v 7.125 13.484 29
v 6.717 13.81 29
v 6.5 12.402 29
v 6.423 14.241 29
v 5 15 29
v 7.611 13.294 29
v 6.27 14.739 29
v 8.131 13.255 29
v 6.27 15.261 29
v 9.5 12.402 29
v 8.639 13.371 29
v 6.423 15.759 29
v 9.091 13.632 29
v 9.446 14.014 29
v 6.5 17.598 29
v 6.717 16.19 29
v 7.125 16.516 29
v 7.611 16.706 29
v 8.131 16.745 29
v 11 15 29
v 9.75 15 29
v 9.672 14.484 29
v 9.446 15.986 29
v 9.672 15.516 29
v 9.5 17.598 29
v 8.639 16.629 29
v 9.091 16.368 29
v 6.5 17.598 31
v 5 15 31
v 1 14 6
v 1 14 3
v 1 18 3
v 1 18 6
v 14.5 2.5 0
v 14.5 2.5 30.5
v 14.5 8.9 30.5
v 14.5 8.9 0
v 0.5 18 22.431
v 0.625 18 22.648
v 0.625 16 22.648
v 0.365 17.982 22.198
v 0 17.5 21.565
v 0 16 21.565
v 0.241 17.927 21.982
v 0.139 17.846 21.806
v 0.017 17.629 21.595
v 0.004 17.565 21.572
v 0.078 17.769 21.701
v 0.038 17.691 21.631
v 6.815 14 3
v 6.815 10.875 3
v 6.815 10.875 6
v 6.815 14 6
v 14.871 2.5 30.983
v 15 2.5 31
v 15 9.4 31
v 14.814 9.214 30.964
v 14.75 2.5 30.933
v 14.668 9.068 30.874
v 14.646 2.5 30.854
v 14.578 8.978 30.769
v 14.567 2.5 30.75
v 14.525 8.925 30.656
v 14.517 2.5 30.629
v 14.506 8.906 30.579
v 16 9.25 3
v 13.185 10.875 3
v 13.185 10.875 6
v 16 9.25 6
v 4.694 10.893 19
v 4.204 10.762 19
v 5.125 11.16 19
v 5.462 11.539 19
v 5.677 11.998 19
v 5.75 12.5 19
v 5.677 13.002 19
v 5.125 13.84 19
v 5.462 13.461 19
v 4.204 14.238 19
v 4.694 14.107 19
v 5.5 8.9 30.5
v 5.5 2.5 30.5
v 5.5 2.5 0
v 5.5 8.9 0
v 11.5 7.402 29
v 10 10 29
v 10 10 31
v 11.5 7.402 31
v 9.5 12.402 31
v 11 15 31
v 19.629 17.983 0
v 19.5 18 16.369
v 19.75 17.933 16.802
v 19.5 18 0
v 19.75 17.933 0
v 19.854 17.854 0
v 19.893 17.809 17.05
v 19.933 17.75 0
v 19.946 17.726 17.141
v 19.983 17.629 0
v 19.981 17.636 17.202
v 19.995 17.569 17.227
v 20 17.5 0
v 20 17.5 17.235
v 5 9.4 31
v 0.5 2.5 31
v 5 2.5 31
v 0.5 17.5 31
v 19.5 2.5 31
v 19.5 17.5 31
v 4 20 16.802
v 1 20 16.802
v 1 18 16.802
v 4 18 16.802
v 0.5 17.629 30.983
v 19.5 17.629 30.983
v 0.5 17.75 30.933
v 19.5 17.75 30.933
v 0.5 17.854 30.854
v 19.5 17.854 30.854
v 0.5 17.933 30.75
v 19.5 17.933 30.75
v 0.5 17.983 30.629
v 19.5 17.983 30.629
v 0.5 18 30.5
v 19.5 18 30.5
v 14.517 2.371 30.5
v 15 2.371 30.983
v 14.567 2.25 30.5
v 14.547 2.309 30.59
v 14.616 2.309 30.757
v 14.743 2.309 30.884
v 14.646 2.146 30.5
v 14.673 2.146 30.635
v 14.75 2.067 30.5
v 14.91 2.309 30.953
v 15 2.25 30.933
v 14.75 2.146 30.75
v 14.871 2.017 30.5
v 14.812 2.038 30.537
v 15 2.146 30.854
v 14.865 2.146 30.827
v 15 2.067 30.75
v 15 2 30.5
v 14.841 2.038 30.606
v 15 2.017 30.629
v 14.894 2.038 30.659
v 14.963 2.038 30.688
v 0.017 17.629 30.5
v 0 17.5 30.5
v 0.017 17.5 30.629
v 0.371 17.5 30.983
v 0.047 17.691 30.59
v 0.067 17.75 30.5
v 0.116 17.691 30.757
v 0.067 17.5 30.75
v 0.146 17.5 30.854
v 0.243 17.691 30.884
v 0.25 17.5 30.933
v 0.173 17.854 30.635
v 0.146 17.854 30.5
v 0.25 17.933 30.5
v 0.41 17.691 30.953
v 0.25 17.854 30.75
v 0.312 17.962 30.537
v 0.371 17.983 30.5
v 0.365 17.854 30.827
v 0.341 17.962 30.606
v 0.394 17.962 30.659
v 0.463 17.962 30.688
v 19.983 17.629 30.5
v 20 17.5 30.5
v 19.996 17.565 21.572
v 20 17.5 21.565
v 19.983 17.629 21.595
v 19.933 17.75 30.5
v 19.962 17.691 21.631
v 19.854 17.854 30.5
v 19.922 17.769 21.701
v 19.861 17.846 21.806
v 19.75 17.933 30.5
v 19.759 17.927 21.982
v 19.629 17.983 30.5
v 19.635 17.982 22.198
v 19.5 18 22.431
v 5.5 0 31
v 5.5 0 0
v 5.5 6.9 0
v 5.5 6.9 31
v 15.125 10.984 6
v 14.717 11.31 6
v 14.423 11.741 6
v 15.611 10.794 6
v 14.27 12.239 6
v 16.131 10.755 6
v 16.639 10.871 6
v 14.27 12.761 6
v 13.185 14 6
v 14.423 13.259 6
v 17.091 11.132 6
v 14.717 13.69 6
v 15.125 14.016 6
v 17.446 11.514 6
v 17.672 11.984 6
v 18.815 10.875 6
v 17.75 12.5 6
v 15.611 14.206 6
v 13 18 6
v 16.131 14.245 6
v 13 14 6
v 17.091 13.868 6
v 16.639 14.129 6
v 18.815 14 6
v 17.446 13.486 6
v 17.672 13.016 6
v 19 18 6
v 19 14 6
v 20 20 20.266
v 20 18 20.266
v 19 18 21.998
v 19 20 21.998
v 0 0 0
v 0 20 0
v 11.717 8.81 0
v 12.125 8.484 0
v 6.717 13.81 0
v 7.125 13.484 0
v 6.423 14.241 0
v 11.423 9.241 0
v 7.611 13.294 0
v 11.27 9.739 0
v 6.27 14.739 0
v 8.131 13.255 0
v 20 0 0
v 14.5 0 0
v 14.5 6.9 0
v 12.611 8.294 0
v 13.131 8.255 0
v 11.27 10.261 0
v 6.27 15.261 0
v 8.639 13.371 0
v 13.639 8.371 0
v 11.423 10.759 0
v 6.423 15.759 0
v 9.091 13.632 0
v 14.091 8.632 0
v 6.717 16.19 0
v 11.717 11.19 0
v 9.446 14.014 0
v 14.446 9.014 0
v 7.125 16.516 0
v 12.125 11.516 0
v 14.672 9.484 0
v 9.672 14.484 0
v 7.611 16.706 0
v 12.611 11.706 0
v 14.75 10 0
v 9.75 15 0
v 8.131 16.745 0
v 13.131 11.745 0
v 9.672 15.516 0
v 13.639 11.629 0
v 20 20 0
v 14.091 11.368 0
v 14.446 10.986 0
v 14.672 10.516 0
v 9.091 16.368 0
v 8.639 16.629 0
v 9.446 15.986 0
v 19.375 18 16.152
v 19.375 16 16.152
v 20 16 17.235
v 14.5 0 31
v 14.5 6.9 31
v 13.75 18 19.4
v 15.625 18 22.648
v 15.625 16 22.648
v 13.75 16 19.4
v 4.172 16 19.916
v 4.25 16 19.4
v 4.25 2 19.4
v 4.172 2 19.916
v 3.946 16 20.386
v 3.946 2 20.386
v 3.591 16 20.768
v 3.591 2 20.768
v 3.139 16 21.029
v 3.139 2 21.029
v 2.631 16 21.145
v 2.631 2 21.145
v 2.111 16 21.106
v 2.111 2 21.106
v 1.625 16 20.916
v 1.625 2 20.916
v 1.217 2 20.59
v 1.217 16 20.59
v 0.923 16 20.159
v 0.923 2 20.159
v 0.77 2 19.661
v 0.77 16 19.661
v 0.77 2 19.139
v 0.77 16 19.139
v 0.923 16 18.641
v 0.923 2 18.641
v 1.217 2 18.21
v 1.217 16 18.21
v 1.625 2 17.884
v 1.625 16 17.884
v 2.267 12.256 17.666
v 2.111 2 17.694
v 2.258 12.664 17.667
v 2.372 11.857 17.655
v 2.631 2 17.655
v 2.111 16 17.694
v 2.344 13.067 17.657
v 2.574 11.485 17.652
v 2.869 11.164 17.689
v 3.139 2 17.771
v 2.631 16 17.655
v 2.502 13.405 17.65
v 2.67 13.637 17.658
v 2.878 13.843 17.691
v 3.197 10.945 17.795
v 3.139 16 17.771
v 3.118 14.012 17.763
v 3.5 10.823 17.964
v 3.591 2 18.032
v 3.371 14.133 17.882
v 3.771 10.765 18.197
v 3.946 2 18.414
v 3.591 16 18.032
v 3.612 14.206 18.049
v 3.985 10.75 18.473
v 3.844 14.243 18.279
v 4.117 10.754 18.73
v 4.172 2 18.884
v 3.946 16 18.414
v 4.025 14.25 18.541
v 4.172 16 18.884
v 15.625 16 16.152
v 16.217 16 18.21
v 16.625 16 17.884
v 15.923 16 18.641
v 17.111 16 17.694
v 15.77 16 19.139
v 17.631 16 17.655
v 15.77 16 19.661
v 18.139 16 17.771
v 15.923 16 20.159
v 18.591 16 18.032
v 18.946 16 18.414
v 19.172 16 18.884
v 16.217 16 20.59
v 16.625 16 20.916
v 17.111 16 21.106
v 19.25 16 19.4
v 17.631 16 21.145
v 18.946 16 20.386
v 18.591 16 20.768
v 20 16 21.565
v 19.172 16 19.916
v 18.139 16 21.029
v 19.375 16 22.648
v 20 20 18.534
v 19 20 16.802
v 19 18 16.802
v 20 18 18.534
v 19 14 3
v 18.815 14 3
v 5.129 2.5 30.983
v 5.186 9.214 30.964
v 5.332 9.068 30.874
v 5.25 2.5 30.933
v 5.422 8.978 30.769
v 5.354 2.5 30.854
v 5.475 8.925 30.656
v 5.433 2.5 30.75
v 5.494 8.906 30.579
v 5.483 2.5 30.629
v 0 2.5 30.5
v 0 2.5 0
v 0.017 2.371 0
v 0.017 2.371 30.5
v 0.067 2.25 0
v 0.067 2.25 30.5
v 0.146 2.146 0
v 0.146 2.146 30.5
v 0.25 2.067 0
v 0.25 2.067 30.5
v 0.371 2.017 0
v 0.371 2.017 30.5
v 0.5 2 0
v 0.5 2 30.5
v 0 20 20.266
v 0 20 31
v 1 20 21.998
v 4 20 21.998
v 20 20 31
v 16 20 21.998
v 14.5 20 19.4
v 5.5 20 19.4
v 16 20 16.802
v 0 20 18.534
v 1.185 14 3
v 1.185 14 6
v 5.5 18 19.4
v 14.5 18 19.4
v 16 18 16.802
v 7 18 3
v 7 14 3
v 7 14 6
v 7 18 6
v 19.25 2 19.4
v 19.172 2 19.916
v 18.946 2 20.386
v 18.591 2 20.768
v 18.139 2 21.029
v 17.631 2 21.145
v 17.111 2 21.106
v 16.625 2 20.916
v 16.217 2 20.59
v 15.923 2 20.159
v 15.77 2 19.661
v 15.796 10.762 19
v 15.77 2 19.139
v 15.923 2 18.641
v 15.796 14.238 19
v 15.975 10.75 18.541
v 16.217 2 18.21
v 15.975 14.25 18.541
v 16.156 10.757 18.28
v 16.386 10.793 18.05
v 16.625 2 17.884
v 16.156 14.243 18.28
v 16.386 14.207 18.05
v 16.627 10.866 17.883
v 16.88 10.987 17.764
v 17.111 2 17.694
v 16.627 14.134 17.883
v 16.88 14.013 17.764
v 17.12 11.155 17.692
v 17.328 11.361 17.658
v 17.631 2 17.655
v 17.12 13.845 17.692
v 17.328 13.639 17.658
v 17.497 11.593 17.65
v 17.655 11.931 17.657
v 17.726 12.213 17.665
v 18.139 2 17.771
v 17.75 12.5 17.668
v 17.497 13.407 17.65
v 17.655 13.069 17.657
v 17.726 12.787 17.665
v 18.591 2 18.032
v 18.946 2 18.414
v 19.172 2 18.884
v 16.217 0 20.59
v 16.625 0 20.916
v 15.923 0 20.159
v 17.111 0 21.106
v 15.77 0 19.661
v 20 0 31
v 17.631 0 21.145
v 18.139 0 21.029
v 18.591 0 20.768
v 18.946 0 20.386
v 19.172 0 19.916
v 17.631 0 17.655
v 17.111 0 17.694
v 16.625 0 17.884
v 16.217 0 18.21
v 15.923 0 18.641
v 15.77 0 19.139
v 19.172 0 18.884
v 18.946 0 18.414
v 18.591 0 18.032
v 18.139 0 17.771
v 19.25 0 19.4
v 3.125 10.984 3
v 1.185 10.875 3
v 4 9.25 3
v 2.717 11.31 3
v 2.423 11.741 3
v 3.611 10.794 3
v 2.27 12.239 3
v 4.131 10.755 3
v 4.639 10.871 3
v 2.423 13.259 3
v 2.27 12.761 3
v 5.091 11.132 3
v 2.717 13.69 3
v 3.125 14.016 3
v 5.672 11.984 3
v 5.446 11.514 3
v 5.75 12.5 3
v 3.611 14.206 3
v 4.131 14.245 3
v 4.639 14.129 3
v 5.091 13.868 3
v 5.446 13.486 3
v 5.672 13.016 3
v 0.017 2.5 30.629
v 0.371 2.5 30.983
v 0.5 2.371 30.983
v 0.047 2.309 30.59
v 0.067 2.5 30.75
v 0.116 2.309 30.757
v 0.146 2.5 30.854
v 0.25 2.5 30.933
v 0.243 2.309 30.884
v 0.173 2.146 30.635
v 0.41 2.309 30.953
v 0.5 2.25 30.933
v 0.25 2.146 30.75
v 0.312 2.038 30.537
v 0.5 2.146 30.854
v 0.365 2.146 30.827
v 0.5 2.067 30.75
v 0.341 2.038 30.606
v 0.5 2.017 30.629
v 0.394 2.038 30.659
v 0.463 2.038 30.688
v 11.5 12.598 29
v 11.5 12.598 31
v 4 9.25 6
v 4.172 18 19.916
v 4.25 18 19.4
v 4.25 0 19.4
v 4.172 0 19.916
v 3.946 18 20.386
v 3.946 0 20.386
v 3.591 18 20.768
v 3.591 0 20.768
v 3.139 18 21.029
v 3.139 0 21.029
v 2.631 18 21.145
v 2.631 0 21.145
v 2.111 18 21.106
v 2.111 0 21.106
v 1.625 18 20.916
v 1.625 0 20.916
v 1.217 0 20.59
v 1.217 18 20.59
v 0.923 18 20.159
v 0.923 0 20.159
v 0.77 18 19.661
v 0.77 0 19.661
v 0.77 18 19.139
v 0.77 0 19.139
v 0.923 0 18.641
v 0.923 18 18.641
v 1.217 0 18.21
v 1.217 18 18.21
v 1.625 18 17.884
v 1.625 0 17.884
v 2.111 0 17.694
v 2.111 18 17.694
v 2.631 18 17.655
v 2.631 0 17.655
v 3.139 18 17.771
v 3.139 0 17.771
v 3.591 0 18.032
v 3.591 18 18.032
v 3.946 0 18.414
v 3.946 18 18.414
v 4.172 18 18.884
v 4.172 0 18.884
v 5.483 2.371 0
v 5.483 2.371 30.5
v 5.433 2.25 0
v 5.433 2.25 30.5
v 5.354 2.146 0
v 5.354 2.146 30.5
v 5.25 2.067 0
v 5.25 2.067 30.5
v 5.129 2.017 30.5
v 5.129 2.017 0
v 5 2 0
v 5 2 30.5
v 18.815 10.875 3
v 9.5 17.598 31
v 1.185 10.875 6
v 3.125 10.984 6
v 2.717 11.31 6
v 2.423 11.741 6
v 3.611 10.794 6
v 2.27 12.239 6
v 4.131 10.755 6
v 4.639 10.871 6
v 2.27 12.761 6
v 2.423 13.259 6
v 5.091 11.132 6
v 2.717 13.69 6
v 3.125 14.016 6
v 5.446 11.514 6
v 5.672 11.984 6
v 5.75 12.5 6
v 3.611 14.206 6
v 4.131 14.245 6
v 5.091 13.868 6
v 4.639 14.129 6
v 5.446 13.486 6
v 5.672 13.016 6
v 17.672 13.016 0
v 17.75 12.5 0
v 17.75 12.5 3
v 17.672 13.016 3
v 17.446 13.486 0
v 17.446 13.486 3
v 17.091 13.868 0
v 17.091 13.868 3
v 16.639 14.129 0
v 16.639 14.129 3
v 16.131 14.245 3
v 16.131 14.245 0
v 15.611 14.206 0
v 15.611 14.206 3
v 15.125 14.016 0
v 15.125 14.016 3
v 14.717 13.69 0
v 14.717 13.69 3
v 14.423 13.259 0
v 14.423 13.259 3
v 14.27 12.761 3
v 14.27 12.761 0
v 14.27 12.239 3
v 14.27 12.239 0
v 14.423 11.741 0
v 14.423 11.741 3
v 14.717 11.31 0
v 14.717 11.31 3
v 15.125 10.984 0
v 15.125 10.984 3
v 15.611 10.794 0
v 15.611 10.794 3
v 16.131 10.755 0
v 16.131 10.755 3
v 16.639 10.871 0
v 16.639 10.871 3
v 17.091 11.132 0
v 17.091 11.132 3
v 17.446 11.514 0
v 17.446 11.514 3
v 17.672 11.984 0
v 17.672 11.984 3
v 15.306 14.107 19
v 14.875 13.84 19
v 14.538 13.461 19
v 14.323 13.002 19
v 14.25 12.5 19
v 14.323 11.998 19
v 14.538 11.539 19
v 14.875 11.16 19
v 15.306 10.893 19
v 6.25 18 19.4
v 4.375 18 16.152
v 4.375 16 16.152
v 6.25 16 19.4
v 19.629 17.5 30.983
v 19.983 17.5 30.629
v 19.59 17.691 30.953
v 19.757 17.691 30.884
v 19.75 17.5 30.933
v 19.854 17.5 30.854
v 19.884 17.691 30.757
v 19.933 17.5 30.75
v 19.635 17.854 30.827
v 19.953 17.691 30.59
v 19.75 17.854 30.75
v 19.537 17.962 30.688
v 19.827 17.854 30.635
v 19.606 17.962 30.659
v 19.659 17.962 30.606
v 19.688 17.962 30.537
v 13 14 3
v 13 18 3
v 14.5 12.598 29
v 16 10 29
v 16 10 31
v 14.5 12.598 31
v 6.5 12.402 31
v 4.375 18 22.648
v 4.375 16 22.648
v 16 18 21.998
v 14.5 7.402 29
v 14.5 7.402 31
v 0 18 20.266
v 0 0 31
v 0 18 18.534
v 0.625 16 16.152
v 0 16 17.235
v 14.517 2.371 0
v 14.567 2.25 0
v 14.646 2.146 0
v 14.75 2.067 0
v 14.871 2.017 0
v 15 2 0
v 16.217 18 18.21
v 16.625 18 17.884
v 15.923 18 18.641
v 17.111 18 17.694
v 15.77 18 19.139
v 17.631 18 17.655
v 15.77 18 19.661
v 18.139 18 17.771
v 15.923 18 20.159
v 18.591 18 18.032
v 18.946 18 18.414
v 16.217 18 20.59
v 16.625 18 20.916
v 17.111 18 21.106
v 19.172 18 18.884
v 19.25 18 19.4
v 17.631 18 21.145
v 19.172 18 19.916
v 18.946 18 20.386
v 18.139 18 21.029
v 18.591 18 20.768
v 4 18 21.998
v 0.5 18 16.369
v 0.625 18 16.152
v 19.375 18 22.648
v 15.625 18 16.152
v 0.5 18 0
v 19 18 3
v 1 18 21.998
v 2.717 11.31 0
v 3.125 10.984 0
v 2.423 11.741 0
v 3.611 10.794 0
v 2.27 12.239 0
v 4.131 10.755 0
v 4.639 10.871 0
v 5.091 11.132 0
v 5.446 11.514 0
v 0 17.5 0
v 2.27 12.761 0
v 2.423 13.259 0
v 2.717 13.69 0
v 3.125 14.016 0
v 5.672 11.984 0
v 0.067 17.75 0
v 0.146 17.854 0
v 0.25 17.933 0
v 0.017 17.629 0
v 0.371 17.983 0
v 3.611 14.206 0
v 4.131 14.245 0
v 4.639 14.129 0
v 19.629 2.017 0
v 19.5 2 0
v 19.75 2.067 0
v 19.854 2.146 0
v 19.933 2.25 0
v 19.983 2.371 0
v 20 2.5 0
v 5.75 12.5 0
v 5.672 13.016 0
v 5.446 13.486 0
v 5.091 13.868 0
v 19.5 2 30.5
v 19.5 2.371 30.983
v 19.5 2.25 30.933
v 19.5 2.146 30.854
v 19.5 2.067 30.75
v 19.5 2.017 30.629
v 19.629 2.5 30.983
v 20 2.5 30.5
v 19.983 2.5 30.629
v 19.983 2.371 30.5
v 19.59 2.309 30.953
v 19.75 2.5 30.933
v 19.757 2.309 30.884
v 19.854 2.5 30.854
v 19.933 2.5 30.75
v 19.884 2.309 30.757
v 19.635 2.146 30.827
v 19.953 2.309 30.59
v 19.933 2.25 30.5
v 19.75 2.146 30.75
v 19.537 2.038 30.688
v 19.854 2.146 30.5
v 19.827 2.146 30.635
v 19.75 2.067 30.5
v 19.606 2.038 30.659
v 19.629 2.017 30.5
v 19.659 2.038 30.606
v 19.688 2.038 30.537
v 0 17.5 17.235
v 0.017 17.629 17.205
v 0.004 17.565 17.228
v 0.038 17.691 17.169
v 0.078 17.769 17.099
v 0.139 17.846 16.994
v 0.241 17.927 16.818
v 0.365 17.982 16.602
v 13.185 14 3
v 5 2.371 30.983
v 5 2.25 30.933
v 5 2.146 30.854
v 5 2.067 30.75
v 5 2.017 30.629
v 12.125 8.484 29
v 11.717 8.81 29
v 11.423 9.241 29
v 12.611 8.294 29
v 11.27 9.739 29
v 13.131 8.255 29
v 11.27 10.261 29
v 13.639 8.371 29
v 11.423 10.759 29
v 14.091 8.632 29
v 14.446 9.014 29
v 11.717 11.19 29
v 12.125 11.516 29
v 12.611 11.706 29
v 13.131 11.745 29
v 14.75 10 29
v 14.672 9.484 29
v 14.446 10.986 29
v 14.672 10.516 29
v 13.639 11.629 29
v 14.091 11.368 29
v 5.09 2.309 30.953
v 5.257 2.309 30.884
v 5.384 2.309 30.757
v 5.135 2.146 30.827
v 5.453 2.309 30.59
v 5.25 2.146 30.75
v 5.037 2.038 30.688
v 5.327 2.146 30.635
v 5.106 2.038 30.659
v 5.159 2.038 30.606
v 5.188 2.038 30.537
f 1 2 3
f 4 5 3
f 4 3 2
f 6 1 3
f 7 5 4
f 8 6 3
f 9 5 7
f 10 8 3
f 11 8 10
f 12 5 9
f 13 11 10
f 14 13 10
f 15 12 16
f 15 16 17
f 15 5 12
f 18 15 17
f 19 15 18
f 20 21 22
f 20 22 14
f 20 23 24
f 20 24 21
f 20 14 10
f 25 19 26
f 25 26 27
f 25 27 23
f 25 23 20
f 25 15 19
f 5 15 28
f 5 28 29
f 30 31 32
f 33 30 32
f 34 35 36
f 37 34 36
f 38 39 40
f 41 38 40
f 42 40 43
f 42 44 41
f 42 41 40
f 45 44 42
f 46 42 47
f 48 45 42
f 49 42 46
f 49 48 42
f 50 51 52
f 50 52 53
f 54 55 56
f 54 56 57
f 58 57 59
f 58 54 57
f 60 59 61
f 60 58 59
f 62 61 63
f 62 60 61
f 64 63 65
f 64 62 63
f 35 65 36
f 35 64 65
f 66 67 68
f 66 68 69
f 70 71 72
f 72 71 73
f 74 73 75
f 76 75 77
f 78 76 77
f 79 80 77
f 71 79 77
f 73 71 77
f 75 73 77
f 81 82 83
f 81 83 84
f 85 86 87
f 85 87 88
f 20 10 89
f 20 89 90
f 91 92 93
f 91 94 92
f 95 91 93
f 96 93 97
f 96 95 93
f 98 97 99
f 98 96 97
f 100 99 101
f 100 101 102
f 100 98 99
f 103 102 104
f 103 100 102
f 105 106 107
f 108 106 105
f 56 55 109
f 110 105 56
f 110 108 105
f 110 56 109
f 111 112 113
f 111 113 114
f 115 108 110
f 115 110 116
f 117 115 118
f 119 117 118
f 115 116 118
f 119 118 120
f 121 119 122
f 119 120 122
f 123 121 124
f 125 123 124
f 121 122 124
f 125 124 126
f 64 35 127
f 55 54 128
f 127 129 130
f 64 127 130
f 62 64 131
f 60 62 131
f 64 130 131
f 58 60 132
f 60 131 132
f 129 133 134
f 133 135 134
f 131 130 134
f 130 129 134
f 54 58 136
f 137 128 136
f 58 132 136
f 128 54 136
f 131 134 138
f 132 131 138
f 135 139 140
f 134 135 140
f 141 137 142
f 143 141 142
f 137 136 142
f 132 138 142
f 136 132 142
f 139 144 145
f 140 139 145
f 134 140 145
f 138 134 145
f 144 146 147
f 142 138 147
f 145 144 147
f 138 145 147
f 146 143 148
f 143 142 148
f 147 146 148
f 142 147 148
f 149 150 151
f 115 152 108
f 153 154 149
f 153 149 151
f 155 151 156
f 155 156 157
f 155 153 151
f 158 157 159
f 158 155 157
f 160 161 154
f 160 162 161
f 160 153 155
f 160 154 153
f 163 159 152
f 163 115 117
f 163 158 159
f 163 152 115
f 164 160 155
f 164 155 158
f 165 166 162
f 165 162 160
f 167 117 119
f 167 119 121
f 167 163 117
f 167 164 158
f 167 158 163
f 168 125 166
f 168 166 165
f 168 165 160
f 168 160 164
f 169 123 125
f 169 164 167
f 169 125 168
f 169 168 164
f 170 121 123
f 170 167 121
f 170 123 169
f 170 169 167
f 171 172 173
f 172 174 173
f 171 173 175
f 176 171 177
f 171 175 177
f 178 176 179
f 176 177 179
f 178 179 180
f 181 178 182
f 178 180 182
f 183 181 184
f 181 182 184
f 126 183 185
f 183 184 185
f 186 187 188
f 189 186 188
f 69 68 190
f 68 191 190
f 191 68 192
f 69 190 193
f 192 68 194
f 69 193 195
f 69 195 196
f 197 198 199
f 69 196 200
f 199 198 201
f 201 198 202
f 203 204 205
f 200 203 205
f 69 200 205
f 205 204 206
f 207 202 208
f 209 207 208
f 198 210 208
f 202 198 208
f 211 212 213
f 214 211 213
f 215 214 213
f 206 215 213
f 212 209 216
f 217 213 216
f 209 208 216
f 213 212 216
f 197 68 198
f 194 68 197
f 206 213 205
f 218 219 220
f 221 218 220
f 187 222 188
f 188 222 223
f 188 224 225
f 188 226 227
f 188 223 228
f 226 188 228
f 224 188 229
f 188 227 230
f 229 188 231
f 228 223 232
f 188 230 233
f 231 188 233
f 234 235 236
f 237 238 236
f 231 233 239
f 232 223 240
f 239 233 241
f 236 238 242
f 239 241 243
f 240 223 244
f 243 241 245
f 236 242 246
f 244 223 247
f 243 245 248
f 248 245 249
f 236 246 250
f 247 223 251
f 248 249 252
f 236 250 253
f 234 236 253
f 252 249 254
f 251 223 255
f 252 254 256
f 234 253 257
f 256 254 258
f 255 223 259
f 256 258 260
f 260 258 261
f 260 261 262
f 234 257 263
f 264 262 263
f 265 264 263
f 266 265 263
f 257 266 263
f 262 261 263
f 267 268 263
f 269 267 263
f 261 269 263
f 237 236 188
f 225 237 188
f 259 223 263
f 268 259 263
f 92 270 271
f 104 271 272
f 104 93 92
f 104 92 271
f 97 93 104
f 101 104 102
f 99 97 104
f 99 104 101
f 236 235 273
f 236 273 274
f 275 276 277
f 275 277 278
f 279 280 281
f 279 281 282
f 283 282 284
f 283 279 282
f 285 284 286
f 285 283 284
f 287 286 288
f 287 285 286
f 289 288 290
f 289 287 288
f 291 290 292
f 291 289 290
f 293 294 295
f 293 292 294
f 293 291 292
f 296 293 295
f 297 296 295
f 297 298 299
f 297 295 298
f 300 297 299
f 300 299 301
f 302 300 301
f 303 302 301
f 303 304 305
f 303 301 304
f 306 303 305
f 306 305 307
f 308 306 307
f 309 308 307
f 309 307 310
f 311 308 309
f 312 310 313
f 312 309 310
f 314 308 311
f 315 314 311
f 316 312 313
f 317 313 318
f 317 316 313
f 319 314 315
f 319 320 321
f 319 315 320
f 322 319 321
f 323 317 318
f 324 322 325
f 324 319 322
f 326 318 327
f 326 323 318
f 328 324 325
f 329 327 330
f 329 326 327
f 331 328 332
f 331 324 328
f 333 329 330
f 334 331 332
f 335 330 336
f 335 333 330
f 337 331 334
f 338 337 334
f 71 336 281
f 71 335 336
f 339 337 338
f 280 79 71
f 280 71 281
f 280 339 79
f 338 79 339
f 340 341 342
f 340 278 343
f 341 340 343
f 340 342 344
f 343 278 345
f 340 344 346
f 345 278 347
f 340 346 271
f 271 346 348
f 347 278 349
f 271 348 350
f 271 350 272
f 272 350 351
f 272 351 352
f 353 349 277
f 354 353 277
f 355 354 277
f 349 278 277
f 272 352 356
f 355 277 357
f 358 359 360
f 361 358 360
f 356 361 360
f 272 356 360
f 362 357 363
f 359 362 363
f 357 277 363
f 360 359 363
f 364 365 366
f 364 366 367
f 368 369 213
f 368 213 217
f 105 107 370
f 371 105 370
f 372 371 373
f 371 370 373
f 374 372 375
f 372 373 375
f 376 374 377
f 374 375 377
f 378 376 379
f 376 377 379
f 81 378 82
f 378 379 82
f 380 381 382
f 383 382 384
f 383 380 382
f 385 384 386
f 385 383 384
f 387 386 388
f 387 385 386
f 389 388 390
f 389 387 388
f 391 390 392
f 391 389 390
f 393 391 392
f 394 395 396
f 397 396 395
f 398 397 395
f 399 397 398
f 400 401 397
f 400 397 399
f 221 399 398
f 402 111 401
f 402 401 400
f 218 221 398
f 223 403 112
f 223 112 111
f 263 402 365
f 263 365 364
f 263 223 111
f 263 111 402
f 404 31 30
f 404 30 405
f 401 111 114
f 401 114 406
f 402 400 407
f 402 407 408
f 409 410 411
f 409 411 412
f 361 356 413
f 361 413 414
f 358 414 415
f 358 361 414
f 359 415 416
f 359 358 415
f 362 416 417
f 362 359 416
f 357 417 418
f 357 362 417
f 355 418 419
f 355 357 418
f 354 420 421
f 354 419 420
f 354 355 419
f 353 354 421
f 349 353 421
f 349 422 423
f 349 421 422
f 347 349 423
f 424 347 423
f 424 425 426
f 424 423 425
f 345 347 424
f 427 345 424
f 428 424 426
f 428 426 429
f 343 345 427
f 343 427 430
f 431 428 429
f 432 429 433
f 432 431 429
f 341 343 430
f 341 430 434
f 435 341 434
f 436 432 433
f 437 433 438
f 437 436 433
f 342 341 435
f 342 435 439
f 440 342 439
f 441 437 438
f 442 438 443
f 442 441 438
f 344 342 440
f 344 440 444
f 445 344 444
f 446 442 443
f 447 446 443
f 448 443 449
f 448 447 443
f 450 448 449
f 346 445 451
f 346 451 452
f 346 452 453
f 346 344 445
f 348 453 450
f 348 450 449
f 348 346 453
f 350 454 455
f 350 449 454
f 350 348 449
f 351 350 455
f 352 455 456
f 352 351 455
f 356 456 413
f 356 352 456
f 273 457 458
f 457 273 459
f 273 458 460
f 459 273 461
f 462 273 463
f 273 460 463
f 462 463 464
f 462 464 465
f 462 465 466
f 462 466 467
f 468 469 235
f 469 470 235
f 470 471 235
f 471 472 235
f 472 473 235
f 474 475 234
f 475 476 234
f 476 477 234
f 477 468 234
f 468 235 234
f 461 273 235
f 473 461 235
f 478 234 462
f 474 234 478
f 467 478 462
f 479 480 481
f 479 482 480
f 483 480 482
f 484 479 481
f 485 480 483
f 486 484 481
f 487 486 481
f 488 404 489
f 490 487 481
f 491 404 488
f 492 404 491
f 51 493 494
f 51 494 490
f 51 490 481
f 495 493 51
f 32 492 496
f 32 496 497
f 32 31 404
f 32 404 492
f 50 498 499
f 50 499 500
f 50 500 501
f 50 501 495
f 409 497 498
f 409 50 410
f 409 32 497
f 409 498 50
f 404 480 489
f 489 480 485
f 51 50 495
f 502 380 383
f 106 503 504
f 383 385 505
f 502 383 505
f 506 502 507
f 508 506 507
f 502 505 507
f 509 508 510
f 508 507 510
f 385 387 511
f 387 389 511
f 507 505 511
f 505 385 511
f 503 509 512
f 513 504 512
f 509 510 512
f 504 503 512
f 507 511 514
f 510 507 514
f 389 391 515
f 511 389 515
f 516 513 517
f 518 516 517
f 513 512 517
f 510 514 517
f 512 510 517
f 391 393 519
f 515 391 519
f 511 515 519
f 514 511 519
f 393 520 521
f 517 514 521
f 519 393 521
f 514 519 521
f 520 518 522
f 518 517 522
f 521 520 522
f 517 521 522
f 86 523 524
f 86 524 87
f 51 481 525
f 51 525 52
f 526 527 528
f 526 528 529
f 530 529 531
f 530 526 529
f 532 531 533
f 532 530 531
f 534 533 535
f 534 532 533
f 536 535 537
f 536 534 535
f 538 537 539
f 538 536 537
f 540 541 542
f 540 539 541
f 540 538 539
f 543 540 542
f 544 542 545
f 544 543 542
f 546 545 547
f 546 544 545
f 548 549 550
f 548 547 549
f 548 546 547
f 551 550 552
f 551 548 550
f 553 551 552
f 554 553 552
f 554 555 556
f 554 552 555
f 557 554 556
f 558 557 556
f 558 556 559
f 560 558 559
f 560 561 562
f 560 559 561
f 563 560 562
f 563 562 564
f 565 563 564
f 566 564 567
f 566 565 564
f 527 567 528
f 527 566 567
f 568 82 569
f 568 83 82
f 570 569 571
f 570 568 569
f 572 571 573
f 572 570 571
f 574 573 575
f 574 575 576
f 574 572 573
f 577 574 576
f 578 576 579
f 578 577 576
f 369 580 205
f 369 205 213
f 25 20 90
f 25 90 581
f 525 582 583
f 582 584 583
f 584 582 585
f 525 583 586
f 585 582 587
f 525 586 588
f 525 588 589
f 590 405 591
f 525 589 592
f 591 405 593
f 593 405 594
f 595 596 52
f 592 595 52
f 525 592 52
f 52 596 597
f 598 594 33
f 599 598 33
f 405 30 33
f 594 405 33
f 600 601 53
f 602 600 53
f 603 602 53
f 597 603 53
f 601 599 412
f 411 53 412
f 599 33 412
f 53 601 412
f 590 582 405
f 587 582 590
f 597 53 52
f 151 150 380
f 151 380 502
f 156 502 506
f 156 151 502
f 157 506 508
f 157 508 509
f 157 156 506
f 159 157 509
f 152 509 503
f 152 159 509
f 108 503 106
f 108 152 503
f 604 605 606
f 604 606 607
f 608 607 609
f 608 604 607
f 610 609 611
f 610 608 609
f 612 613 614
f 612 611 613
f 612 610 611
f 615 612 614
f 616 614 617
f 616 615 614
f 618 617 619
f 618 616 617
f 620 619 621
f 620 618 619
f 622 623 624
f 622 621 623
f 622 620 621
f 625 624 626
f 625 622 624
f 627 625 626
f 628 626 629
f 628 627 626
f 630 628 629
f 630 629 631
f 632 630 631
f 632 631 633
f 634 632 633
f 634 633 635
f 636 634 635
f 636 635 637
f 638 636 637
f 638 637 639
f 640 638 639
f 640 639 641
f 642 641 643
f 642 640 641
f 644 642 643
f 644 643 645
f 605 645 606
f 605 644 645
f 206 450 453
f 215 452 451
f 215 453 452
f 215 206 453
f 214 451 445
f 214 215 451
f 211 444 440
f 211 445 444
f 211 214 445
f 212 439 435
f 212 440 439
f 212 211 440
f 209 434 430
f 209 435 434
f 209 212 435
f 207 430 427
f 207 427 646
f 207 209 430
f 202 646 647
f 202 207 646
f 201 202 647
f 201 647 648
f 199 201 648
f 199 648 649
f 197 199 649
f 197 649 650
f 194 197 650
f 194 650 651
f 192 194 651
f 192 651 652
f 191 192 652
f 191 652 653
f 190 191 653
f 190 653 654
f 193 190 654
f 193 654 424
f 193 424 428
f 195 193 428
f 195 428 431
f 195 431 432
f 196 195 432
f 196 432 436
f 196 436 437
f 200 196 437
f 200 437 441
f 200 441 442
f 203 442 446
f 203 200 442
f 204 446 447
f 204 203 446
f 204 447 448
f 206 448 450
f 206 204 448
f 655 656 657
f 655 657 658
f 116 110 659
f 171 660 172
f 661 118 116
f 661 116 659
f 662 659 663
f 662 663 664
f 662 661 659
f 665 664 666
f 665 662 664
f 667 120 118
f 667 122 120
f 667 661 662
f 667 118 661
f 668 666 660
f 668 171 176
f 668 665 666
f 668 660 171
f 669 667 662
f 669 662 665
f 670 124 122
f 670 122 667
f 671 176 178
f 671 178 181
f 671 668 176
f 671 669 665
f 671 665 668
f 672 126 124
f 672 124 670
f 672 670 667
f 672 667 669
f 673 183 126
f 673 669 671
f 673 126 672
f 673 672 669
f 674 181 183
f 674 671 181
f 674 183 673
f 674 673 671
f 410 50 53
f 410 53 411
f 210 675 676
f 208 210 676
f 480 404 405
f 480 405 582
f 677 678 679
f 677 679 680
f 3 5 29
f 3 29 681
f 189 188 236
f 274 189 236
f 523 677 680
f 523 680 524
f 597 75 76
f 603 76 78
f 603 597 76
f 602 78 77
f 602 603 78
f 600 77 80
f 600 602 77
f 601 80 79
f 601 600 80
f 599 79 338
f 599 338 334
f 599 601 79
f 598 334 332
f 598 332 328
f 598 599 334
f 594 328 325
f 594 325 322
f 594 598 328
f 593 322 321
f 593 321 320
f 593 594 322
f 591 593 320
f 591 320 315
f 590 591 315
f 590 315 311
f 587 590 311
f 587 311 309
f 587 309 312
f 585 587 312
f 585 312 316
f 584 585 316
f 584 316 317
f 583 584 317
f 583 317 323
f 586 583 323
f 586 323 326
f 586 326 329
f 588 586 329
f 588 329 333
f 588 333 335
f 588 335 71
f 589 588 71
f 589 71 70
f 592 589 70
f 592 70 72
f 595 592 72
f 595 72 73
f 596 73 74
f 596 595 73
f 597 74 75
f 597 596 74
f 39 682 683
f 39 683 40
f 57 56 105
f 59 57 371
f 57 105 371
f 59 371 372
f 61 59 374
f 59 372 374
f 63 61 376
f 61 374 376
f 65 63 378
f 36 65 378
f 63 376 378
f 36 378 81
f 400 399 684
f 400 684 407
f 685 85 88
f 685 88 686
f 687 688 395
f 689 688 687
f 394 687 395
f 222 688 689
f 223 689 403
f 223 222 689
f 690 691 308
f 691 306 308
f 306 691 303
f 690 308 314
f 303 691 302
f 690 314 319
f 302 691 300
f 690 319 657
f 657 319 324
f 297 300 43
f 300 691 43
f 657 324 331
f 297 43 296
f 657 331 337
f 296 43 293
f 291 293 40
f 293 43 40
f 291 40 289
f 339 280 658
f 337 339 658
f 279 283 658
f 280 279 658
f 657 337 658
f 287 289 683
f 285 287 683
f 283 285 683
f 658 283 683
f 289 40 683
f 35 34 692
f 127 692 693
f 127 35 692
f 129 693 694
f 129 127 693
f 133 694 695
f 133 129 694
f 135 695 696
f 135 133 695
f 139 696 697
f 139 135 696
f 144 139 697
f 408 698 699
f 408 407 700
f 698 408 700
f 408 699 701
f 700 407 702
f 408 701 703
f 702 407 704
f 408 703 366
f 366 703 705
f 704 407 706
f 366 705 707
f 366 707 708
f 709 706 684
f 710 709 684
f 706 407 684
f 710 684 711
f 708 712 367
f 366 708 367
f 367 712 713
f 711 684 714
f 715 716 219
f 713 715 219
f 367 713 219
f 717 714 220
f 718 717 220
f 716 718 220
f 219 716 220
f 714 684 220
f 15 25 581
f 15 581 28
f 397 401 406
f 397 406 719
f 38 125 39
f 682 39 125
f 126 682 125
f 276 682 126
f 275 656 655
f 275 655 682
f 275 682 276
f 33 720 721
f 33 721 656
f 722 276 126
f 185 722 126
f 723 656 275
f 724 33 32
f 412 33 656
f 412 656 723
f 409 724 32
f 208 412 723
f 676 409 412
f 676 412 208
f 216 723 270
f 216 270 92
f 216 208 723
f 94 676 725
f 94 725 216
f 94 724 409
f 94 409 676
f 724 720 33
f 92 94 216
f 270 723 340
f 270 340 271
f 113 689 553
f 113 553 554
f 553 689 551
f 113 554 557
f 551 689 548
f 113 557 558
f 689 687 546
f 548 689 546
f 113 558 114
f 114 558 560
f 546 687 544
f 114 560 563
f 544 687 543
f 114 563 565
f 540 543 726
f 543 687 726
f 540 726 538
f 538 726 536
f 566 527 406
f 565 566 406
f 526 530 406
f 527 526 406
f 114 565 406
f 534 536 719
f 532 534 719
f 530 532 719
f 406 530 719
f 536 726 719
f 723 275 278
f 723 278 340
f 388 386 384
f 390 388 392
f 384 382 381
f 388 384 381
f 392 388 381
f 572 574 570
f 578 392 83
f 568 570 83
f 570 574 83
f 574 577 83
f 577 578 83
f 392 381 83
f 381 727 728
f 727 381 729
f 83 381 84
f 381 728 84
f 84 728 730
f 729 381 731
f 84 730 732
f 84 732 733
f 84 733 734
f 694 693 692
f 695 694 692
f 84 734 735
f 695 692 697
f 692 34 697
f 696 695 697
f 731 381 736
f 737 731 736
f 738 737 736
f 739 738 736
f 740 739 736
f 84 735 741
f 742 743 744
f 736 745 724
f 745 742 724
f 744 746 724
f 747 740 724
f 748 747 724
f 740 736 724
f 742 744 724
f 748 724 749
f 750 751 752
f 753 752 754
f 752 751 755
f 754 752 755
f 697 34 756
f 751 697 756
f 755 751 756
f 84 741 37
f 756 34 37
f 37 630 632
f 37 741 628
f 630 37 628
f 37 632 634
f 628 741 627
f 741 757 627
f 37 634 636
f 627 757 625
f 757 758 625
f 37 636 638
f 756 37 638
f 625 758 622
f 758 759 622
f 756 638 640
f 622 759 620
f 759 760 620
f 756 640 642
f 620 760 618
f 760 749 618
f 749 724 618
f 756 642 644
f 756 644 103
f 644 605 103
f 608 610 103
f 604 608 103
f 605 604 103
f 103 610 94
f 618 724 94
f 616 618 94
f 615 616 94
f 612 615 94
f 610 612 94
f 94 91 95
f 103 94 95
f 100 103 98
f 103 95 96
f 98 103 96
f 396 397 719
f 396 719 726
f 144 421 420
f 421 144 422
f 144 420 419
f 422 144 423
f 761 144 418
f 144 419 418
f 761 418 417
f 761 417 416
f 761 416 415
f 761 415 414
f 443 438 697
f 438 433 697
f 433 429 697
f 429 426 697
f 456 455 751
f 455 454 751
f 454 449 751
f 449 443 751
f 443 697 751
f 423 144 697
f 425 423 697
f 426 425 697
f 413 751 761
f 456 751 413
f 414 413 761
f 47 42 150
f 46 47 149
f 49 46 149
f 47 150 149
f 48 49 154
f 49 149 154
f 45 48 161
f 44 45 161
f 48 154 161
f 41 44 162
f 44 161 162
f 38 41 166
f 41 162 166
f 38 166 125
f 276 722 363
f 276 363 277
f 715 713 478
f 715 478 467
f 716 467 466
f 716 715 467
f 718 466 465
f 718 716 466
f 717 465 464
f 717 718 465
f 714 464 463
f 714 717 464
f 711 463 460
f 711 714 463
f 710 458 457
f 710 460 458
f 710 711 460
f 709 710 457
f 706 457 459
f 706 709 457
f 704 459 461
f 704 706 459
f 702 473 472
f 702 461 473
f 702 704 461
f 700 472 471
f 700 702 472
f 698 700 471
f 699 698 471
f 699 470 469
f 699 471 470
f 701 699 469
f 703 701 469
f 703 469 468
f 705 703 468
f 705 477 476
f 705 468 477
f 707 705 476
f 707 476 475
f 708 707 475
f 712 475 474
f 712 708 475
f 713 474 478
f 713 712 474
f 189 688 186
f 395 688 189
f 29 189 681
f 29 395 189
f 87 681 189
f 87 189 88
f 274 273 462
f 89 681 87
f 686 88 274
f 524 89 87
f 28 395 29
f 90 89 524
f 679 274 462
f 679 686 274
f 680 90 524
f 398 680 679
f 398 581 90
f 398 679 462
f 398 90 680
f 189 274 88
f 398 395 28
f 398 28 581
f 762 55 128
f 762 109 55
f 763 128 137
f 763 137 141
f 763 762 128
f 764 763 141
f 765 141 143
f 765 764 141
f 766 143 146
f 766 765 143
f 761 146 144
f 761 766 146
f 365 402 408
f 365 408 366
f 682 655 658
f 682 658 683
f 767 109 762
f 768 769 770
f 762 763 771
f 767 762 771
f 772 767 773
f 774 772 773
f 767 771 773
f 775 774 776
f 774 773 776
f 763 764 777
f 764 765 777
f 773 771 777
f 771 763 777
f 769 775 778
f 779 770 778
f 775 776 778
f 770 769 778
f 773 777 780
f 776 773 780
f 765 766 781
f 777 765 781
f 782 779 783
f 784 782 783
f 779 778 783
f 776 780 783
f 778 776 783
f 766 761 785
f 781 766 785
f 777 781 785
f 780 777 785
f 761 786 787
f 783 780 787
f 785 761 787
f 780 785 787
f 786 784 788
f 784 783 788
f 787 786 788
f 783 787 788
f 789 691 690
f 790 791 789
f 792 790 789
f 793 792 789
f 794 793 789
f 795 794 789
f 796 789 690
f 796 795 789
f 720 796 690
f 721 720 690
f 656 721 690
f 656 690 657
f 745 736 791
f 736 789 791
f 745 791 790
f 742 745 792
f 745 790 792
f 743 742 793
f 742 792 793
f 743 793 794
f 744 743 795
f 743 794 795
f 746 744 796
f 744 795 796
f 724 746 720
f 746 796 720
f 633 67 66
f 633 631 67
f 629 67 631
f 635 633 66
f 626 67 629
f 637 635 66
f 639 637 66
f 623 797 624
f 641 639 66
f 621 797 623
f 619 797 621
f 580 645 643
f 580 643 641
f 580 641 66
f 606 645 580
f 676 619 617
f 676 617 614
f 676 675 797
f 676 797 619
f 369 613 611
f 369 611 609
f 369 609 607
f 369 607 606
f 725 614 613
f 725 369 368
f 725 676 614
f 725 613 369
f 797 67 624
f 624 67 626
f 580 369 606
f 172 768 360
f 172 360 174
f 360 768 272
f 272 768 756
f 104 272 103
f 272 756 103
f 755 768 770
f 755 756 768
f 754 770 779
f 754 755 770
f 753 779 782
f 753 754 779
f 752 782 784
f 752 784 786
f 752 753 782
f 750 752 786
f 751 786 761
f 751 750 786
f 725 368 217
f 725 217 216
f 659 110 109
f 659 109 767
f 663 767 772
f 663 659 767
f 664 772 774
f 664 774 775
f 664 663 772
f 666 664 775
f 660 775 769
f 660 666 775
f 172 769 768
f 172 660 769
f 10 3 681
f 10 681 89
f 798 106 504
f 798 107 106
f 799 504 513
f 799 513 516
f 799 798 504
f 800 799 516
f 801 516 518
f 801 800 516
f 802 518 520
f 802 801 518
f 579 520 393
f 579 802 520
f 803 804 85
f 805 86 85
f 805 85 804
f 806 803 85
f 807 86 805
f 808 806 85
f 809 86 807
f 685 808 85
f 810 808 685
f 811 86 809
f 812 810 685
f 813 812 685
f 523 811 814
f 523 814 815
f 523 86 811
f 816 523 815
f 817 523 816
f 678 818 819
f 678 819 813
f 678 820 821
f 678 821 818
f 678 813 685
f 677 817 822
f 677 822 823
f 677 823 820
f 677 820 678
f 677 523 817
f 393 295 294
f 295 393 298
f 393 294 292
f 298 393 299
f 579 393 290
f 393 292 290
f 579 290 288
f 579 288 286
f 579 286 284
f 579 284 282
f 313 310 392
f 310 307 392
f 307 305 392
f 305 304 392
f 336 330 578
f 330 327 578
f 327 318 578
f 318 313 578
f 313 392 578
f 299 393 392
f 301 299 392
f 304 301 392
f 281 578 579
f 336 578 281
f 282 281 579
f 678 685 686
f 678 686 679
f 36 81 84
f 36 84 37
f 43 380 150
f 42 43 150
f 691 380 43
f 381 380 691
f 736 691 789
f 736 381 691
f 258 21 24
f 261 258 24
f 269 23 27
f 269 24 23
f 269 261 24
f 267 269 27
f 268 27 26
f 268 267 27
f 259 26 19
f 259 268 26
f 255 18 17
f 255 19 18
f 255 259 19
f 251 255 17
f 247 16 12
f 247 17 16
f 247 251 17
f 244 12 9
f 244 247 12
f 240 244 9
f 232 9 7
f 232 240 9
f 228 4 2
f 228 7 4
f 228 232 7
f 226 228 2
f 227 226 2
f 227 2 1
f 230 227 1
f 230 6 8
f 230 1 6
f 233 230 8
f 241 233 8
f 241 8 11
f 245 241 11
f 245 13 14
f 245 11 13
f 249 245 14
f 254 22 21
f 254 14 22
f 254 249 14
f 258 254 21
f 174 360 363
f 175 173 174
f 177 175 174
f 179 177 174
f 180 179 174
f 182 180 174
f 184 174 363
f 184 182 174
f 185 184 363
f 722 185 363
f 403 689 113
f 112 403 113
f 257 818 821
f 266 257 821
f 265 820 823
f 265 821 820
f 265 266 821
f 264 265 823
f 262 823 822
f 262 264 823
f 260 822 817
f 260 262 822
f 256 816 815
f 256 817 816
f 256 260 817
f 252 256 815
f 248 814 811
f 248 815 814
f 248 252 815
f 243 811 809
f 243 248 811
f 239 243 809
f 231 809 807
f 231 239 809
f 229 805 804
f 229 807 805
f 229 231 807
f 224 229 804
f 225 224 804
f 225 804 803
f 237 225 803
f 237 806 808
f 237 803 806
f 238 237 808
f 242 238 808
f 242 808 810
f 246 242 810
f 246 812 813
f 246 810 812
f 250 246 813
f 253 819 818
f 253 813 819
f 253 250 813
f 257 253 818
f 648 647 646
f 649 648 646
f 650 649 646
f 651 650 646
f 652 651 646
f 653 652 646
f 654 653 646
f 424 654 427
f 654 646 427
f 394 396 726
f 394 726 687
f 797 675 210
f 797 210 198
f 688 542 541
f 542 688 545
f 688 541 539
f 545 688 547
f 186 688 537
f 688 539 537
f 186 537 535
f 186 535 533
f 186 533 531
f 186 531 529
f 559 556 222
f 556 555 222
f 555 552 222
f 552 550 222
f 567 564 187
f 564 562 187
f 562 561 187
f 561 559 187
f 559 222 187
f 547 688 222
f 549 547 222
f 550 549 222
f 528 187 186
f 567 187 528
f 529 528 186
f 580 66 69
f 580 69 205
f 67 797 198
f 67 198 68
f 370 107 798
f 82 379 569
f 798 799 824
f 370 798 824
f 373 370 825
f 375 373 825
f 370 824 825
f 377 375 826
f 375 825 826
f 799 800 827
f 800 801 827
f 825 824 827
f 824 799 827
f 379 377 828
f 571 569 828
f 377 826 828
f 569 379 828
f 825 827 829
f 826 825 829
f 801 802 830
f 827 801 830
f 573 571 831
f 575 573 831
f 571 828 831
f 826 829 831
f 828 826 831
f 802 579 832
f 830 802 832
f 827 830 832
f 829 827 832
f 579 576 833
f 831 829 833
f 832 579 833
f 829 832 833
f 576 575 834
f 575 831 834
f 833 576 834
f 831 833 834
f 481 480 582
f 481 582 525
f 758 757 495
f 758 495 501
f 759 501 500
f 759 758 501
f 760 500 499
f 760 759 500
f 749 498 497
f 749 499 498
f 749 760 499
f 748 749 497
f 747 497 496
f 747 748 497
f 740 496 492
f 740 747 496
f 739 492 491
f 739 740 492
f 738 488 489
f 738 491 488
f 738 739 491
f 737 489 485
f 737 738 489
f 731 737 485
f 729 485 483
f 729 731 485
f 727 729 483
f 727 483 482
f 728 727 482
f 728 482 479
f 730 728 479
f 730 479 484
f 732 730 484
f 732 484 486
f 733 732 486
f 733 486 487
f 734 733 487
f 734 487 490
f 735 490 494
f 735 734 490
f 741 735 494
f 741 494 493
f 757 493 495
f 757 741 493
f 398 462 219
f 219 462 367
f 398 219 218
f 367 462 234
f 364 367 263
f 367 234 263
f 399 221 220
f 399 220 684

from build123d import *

# Parameters (mm, degrees)
BOX001_W          = 9
BOX001_H          = 7
BOX001_DEPTH      = 42
PRISM003_DEPTH    = 10
PRISM002_DEPTH    = 10
CYLINDER004_R     = 1.75
CYLINDER004_DEPTH = 43
CYLINDER003_R     = 1.75
CYLINDER003_DEPTH = 40
CYLINDER002_R     = 1.75
CYLINDER002_DEPTH = 39
CYLINDER001_R     = 1.75
CYLINDER001_DEPTH = 41
PRISM001_DEPTH    = 10
PRISM_DEPTH       = 10
BOX_W             = 20
BOX_H             = 20
BOX_DEPTH         = 31
BOX009_W          = 30
BOX009_H          = 30
BOX009_DEPTH      = 35
BOX008_W          = 30
BOX008_H          = 30
BOX008_DEPTH      = 35
PRISM004_DEPTH    = 3
CYLINDER005_R     = 1.75
CYLINDER005_DEPTH = 20
BOX004_W          = 6
BOX004_H          = 20
BOX004_DEPTH      = 3
PRISM007_DEPTH    = 3
CYLINDER008_R     = 1.75
CYLINDER008_DEPTH = 20
BOX007_W          = 6
BOX007_H          = 20
BOX007_DEPTH      = 3
BOX006_W          = 9
BOX006_H          = 9
BOX006_DEPTH      = 42
CYLINDER006_R     = 1.75
CYLINDER006_DEPTH = 39
CYLINDER007_R     = 1.75
CYLINDER007_DEPTH = 41
PRISM005_DEPTH    = 10
PRISM006_DEPTH    = 10
BOX005_W          = 20
BOX005_H          = 20
BOX005_DEPTH      = 31
FILLET_R          = 0.5
FILLET001_R       = 0.5


with BuildPart() as cubo001:
    # Box001 → Box001 (new body)
    with BuildSketch(Plane(origin=(5.5, -0.1, -6), x_dir=(1, 0, 0), z_dir=(0, 0, 1))):
        with Locations((4.5, 3.5)):
            Rectangle(BOX001_W, BOX001_H)
    extrude(amount=BOX001_DEPTH)


with BuildPart() as prisma003:
    # Prism003 → Prism003 (new body)
    with BuildSketch(Plane(origin=(8, 15, 29), x_dir=(1, 0, 0), z_dir=(0, 0, 1))):
        Polygon((3, 0), (1.5, 2.598076), (-1.5, 2.598076), (-3, 0), (-1.5, -2.598076), (1.5, -2.598076), align=None)
    extrude(amount=PRISM003_DEPTH)


with BuildPart() as prisma002:
    # Prism002 → Prism002 (new body)
    with BuildSketch(Plane(origin=(13, 10, 29), x_dir=(1, 0, 0), z_dir=(0, 0, 1))):
        Polygon((3, 0), (1.5, 2.598076), (-1.5, 2.598076), (-3, 0), (-1.5, -2.598076), (1.5, -2.598076), align=None)
    extrude(amount=PRISM002_DEPTH)


with BuildPart() as cilindro004:
    # Cylinder004 → Cylinder004 (new body)
    with BuildSketch(Plane(origin=(8, 15, -3), x_dir=(1, 0, 0), z_dir=(0, 0, 1))):
        Circle(CYLINDER004_R)
    extrude(amount=CYLINDER004_DEPTH)


with BuildPart() as cilindro003:
    # Cylinder003 → Cylinder003 (new body)
    with BuildSketch(Plane(origin=(13, 10, -3), x_dir=(1, 0, 0), z_dir=(0, 0, 1))):
        Circle(CYLINDER003_R)
    extrude(amount=CYLINDER003_DEPTH)


with BuildPart() as cilindro002:
    # Cylinder002 → Cylinder002 (new body)
    with BuildSketch(Plane(origin=(17.5, 32, 19.4), x_dir=(1, 0, 0), z_dir=(0, -1, 0))):
        Circle(CYLINDER002_R)
    extrude(amount=CYLINDER002_DEPTH)


with BuildPart() as cilindro001:
    # Cylinder001 → Cylinder001 (new body)
    with BuildSketch(Plane(origin=(2.5, 30, 19.4), x_dir=(1, 0, 0), z_dir=(0, -1, 0))):
        Circle(CYLINDER001_R)
    extrude(amount=CYLINDER001_DEPTH)


with BuildPart() as prisma001:
    # Prism001 → Prism001 (new body)
    with BuildSketch(Plane(origin=(17.5, 28, 19.4), x_dir=(1, 0, 0), z_dir=(0, -1, 0))):
        Polygon((3, 0), (1.5, 2.598076), (-1.5, 2.598076), (-3, 0), (-1.5, -2.598076), (1.5, -2.598076), align=None)
    extrude(amount=PRISM001_DEPTH)


with BuildPart() as prisma:
    # Prism → Prism (new body)
    with BuildSketch(Plane(origin=(2.5, 28, 19.4), x_dir=(1, 0, 0), z_dir=(0, -1, 0))):
        Polygon((3, 0), (1.5, 2.598076), (-1.5, 2.598076), (-3, 0), (-1.5, -2.598076), (1.5, -2.598076), align=None)
    extrude(amount=PRISM_DEPTH)


with BuildPart() as nada:
    # Box → Box (new body)
    with BuildSketch(Plane.XY):
        with Locations((10, 10)):
            Rectangle(BOX_W, BOX_H)
    extrude(amount=BOX_DEPTH)

    # Cut: cut Prisma
    add(prisma.part, mode=Mode.SUBTRACT)

    # Cut001: cut Prisma001
    add(prisma001.part, mode=Mode.SUBTRACT)

    # Cut002: cut Cilindro001
    add(cilindro001.part, mode=Mode.SUBTRACT)

    # Cut003: cut Cilindro002
    add(cilindro002.part, mode=Mode.SUBTRACT)

    # Cut004: cut Cilindro003
    add(cilindro003.part, mode=Mode.SUBTRACT)

    # Cut005: cut Cilindro004
    add(cilindro004.part, mode=Mode.SUBTRACT)

    # Cut006: cut Prisma002
    add(prisma002.part, mode=Mode.SUBTRACT)

    # Cut007: cut Prisma003
    add(prisma003.part, mode=Mode.SUBTRACT)

    # Cut008: cut Cubo001
    add(cubo001.part, mode=Mode.SUBTRACT)


with BuildPart() as cubo009:
    # Box009 → Box009 (new body)
    with BuildSketch(Plane(origin=(0, -28, 0), x_dir=(1, 0, 0), z_dir=(0, 0, 1))):
        with Locations((15, 15)):
            Rectangle(BOX009_W, BOX009_H)
    extrude(amount=BOX009_DEPTH)


with BuildPart() as cubo008:
    # Box008 → Box008 (new body)
    with BuildSketch(Plane(origin=(0, 18, 0), x_dir=(1, 0, 0), z_dir=(0, 0, 1))):
        with Locations((15, 15)):
            Rectangle(BOX008_W, BOX008_H)
    extrude(amount=BOX008_DEPTH)


with BuildPart() as prisma004:
    # Prism004 → Prism004 (new body)
    with BuildSketch(Plane(origin=(34, 7.5, 3), x_dir=(0, 1, 0), z_dir=(0, 0, 1))):
        Polygon((3.25, 0), (1.625, 2.814583), (-1.625, 2.814583), (-3.25, 0), (-1.625, -2.814583), (1.625, -2.814583), align=None)
    extrude(amount=PRISM004_DEPTH)


with BuildPart() as cilindro005:
    # Cylinder005 → Cylinder005 (new body)
    with BuildSketch(Plane(origin=(34, 7.5, -1), x_dir=(1, 0, 0), z_dir=(0, 0, 1))):
        Circle(CYLINDER005_R)
    extrude(amount=CYLINDER005_DEPTH)


with BuildPart() as fusion001:
    # Box004 → Box004 (new body)
    with BuildSketch(Plane(origin=(31, 9, 3), x_dir=(1, 0, 0), z_dir=(0, 0, 1))):
        with Locations((3, 10)):
            Rectangle(BOX004_W, BOX004_H)
    extrude(amount=BOX004_DEPTH)

    # Fusion001: union Prisma004, Cilindro005
    add(prisma004.part)
    add(cilindro005.part)


with BuildPart() as fusion001_1:
    # Fusion001 placement: moved
    add(fusion001.part.moved(Location((-18, 5, 0))))


with BuildPart() as prisma007:
    # Prism007 → Prism007 (new body)
    with BuildSketch(Plane(origin=(34, 7.5, 3), x_dir=(0, 1, 0), z_dir=(0, 0, 1))):
        Polygon((3.25, 0), (1.625, 2.814583), (-1.625, 2.814583), (-3.25, 0), (-1.625, -2.814583), (1.625, -2.814583), align=None)
    extrude(amount=PRISM007_DEPTH)


with BuildPart() as cilindro008:
    # Cylinder008 → Cylinder008 (new body)
    with BuildSketch(Plane(origin=(34, 7.5, -1), x_dir=(1, 0, 0), z_dir=(0, 0, 1))):
        Circle(CYLINDER008_R)
    extrude(amount=CYLINDER008_DEPTH)


with BuildPart() as fusion002:
    # Box007 → Box007 (new body)
    with BuildSketch(Plane(origin=(31, 9, 3), x_dir=(1, 0, 0), z_dir=(0, 0, 1))):
        with Locations((3, 10)):
            Rectangle(BOX007_W, BOX007_H)
    extrude(amount=BOX007_DEPTH)

    # Fusion002: union Prisma007, Cilindro008
    add(prisma007.part)
    add(cilindro008.part)


with BuildPart() as fusion002_1:
    # Fusion002 placement: moved
    add(fusion002.part.moved(Location((-30, 5, 0))))


with BuildPart() as cubo006:
    # Box006 → Box006 (new body)
    with BuildSketch(Plane(origin=(5.5, -0.1, -6), x_dir=(1, 0, 0), z_dir=(0, 0, 1))):
        with Locations((4.5, 4.5)):
            Rectangle(BOX006_W, BOX006_H)
    extrude(amount=BOX006_DEPTH)


with BuildPart() as cilindro006:
    # Cylinder006 → Cylinder006 (new body)
    with BuildSketch(Plane(origin=(17.5, 32, 19.4), x_dir=(1, 0, 0), z_dir=(0, -1, 0))):
        Circle(CYLINDER006_R)
    extrude(amount=CYLINDER006_DEPTH)


with BuildPart() as cilindro007:
    # Cylinder007 → Cylinder007 (new body)
    with BuildSketch(Plane(origin=(2.5, 30, 19.4), x_dir=(1, 0, 0), z_dir=(0, -1, 0))):
        Circle(CYLINDER007_R)
    extrude(amount=CYLINDER007_DEPTH)


with BuildPart() as prisma005:
    # Prism005 → Prism005 (new body)
    with BuildSketch(Plane(origin=(17.5, 26, 19.4), x_dir=(1, 0, 0), z_dir=(0, -1, 0))):
        Polygon((3.75, 0), (1.875, 3.247595), (-1.875, 3.247595), (-3.75, 0), (-1.875, -3.247595), (1.875, -3.247595), align=None)
    extrude(amount=PRISM005_DEPTH)


with BuildPart() as prisma006:
    # Prism006 → Prism006 (new body)
    with BuildSketch(Plane(origin=(2.5, 26, 19.4), x_dir=(1, 0, 0), z_dir=(0, -1, 0))):
        Polygon((3.75, 0), (1.875, 3.247595), (-1.875, 3.247595), (-3.75, 0), (-1.875, -3.247595), (1.875, -3.247595), align=None)
    extrude(amount=PRISM006_DEPTH)


with BuildPart() as fillet001:
    # Box005 → Box005 (new body)
    with BuildSketch(Plane.XY):
        with Locations((10, 10)):
            Rectangle(BOX005_W, BOX005_H)
    extrude(amount=BOX005_DEPTH)

    # Cut009: cut Prisma006
    add(prisma006.part, mode=Mode.SUBTRACT)

    # Cut010: cut Prisma005
    add(prisma005.part, mode=Mode.SUBTRACT)

    # Cut011: cut Cilindro007
    add(cilindro007.part, mode=Mode.SUBTRACT)

    # Cut012: cut Cilindro006
    add(cilindro006.part, mode=Mode.SUBTRACT)

    # Cut013: cut Cubo006
    add(cubo006.part, mode=Mode.SUBTRACT)

    # Cut014: cut Fusion002
    add(fusion002_1.part, mode=Mode.SUBTRACT)

    # Cut015: cut Fusion001
    add(fusion001_1.part, mode=Mode.SUBTRACT)

    # Fillet
    fillet_edges = [fillet001.edges().sort_by_distance(p)[0] for p in [
        (0, 10, 31),
        (0, 20, 26.282532),
        (0, 20, 8.617468),
        (0, 0, 15.5),
        (10, 20, 31),
        (20, 10, 31),
        (17.25, 0, 31),
        (14.5, 4.45, 31),
        (10, 8.9, 31),
        (5.5, 4.45, 31),
        (2.75, 0, 31),
        (20, 20, 8.617468),
        (20, 20, 26.282532),
        (5.5, 0, 15.5),
        (20, 0, 15.5),
        (14.5, 0, 15.5),
    ]]
    fillet(fillet_edges, radius=FILLET_R)

    # Cut016: cut Cubo008
    add(cubo008.part, mode=Mode.SUBTRACT)

    # Cut017: cut Cubo009
    add(cubo009.part, mode=Mode.SUBTRACT)

    # Fillet001
    fillet001_edges = [fillet001.edges().sort_by_distance(p)[0] for p in [
        (0, 18, 8.617468),
        (0, 2, 15.25),
        (0, 18, 26.032532),
        (20, 18, 8.617468),
        (20, 18, 26.032532),
        (10, 18, 31),
        (5.5, 2, 15.25),
        (2.75, 2, 31),
        (20, 2, 15.25),
        (17.25, 2, 31),
        (14.5, 2, 15.25),
    ]]
    fillet(fillet001_edges, radius=FILLET001_R)


solid = Compound([nada.part, fillet001.part])
